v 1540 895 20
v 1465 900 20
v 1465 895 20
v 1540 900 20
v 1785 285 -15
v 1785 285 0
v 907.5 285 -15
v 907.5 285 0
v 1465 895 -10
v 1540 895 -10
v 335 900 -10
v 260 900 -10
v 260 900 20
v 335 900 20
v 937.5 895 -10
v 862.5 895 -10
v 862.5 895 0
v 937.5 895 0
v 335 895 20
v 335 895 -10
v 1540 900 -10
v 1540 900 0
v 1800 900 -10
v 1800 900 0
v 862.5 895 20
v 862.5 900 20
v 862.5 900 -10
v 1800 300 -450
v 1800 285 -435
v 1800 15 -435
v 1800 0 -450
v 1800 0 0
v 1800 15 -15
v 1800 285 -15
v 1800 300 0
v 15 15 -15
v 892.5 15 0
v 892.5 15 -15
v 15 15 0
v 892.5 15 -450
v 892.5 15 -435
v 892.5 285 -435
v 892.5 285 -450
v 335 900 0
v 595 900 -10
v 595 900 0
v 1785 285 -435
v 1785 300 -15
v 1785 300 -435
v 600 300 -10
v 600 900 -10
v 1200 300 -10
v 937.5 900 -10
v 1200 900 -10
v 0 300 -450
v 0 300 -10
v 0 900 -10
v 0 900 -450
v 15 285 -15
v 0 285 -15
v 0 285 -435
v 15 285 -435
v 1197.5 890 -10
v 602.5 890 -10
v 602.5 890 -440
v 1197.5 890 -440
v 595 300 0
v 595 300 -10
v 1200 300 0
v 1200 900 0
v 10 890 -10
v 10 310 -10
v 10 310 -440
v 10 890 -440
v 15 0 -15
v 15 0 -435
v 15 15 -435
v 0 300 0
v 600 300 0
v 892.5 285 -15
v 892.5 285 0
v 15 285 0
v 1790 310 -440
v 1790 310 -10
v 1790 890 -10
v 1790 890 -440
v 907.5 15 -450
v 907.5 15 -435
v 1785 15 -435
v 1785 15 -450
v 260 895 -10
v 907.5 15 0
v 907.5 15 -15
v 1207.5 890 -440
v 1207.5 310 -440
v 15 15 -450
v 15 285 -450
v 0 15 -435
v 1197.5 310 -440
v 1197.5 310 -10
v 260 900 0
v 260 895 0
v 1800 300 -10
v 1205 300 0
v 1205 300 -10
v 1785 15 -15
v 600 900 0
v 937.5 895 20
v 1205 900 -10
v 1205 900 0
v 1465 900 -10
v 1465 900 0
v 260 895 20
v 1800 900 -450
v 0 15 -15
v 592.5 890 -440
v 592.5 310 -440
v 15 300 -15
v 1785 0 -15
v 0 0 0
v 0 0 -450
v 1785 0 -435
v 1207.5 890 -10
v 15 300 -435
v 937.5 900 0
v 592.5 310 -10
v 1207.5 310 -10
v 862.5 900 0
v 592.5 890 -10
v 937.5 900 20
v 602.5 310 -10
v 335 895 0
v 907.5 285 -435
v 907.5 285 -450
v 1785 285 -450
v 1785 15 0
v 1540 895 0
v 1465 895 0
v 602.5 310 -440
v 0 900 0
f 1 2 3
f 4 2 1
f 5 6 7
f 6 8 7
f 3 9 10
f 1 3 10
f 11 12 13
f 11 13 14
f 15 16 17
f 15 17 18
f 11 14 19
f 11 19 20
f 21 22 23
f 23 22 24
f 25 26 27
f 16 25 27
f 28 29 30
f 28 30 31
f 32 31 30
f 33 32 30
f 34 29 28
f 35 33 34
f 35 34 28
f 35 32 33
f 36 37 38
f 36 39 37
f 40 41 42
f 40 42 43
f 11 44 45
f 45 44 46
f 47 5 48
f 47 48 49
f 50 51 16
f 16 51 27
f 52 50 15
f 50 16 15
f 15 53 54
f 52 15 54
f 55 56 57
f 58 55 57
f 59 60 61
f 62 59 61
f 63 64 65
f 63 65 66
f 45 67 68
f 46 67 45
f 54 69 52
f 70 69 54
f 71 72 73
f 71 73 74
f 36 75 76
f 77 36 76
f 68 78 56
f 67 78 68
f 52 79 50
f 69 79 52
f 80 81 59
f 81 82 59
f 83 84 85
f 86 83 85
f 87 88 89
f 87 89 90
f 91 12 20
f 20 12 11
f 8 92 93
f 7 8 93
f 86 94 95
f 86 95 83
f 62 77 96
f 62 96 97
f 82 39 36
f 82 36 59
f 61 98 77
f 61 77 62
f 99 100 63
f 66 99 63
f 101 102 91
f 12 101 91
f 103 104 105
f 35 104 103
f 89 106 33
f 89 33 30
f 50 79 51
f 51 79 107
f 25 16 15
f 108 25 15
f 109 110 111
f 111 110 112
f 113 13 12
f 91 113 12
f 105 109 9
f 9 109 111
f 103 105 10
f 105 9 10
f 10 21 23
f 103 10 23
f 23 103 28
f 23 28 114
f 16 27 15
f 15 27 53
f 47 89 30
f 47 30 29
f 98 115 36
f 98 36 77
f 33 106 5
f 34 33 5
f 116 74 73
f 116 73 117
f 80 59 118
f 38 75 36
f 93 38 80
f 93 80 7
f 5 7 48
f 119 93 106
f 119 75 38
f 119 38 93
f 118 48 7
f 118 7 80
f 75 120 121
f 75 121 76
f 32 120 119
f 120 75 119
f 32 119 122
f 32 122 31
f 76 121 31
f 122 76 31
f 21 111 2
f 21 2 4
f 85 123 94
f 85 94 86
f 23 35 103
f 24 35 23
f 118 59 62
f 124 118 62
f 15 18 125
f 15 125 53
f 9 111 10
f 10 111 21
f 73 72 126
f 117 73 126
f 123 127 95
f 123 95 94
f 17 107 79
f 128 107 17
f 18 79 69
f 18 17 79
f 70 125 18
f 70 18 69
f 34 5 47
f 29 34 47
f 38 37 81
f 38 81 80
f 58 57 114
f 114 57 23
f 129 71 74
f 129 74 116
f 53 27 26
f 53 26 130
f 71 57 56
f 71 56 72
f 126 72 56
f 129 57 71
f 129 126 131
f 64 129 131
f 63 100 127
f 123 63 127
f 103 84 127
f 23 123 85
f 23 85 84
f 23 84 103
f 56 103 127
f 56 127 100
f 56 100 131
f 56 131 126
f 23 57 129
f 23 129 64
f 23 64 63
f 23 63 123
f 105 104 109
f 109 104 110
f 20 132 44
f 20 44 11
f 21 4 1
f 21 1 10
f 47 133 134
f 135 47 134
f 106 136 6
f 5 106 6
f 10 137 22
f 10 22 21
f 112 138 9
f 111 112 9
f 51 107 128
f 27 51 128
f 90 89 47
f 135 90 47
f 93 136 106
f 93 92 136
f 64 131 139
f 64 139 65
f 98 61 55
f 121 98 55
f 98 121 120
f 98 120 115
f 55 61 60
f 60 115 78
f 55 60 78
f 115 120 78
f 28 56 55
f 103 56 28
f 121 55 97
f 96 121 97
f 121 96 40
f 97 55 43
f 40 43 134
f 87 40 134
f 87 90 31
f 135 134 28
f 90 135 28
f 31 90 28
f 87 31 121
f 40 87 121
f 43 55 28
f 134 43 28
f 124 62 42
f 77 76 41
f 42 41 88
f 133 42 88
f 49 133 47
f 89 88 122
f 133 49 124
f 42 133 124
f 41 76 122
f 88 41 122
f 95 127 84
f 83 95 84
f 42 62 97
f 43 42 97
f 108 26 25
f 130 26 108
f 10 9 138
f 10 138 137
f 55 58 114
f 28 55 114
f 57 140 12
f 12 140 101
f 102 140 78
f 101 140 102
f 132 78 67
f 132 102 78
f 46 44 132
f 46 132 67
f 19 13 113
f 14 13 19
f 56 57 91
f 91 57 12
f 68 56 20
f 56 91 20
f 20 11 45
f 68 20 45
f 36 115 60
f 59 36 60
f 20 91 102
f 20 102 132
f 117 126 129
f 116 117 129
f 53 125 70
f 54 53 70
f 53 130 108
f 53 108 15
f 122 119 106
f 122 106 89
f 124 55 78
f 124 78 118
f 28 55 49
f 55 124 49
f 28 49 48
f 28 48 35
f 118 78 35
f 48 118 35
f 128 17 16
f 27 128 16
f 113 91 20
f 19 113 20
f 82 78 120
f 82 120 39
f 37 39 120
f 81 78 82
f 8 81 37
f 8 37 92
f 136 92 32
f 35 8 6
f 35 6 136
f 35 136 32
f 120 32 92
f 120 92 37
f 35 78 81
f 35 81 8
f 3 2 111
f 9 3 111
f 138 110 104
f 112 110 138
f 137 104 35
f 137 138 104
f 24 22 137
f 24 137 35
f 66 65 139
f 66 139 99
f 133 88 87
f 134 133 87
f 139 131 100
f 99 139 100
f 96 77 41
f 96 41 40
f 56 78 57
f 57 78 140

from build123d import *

# Parameters (mm, degrees)
CROQUIS1_W                = 1800
CROQUIS1_H                = 300
CROQUIS1_W_2              = 1770
CROQUIS1_H_2              = 270
SALIENTE_EXTRUIR1_DEPTH   = 450
CROQUIS2_W                = 420
CROQUIS2_H                = 270
CORTAR_EXTRUIR1_DEPTH     = 1900
CROQUIS3_W                = 1770
CROQUIS3_H                = 420
CORTAR_EXTRUIR2_DEPTH     = 400
SALIENTE_EXTRUIR2_START   = -10
CROQUIS4_W                = 1800
CROQUIS4_H                = 600
SALIENTE_EXTRUIR2_DEPTH   = 440
VACIADO1_T                = -10
CROQUIS5_W                = 595
CROQUIS5_H                = 600
SALIENTE_EXTRUIR3_DEPTH   = 10
CROQUIS5_W_2              = 600
SALIENTE_EXTRUIR3_2_DEPTH = 10
SALIENTE_EXTRUIR3_3_DEPTH = 10
CROQUIS6_W                = 15
CROQUIS6_H                = 15
SALIENTE_EXTRUIR4_DEPTH   = 300
SALIENTE_EXTRUIR5_START   = -10
CROQUIS7_W                = 10
CROQUIS7_H                = 600
SALIENTE_EXTRUIR5_DEPTH   = 430
CORTAR_EXTRUIR3_START     = 895
CROQUIS8_W                = 75
CROQUIS8_H                = 10
CORTAR_EXTRUIR3_DEPTH     = 5
SALIENTE_EXTRUIR6_START   = 900
CROQUIS9_W                = 75
CROQUIS9_H                = 30
SALIENTE_EXTRUIR6_DEPTH   = 5
SALIENTE_EXTRUIR6_2_DEPTH = 5
SALIENTE_EXTRUIR6_3_DEPTH = 5


with BuildPart() as part:
    # Croquis1 → Saliente-Extruir1 (new body)
    with BuildSketch(Plane.XY):
        with Locations((900, 150)):
            Rectangle(CROQUIS1_W, CROQUIS1_H)
        with Locations((900, 150)):
            Rectangle(CROQUIS1_W_2, CROQUIS1_H_2, mode=Mode.SUBTRACT)
    extrude(amount=-SALIENTE_EXTRUIR1_DEPTH)

    # Croquis2 → Cortar-Extruir1 (cut)
    with BuildSketch(Plane(origin=(0, 0, 0), x_dir=(0, 0, -1), z_dir=(1, 0, 0))):
        with Locations((225, 150)):
            Rectangle(CROQUIS2_W, CROQUIS2_H)
    extrude(amount=CORTAR_EXTRUIR1_DEPTH, mode=Mode.SUBTRACT)

    # Croquis3 → Cortar-Extruir2 (cut)
    with BuildSketch(Plane(origin=(0, 0, 0), x_dir=(1, 0, 0), z_dir=(0, 1, 0))):
        with Locations((900, 225)):
            Rectangle(CROQUIS3_W, CROQUIS3_H)
    extrude(amount=CORTAR_EXTRUIR2_DEPTH, mode=Mode.SUBTRACT)

    # Croquis6 → Saliente-Extruir4 (add)
    with BuildSketch(Plane(origin=(0, 0, 0), x_dir=(1, 0, 0), z_dir=(0, 1, 0))):
        with Locations((900, 7.5)):
            Rectangle(CROQUIS6_W, CROQUIS6_H)
        with Locations((900, 442.5)):
            Rectangle(CROQUIS6_W, CROQUIS6_H)
    extrude(amount=SALIENTE_EXTRUIR4_DEPTH)


with BuildPart() as body_2:
    # Croquis4 → Saliente-Extruir2 (new body)
    with BuildSketch(Plane.XY.offset(SALIENTE_EXTRUIR2_START)):
        with Locations((900, 600)):
            Rectangle(CROQUIS4_W, CROQUIS4_H)
    extrude(amount=-SALIENTE_EXTRUIR2_DEPTH)

    # Vaciado1
    vaciado1_openings = [body_2.faces().sort_by_distance(p)[0] for p in [
        (900, 600, -10),
    ]]
    offset(amount=VACIADO1_T, openings=vaciado1_openings, kind=Kind.INTERSECTION)

    # Croquis7 → Saliente-Extruir5 (add)
    with BuildSketch(Plane.XY.offset(SALIENTE_EXTRUIR5_START)):
        with Locations((597.5, 600)):
            Rectangle(CROQUIS7_W, CROQUIS7_H)
        with Locations((1202.5, 600)):
            Rectangle(CROQUIS7_W, CROQUIS7_H)
    extrude(amount=-SALIENTE_EXTRUIR5_DEPTH)


with BuildPart() as body_3:
    # Croquis5 → Saliente-Extruir3 (new body)
    with BuildSketch(Plane.XY):
        with Locations((297.5, 600)):
            Rectangle(CROQUIS5_W, CROQUIS5_H)
    extrude(amount=-SALIENTE_EXTRUIR3_DEPTH)


with BuildPart() as body_4:
    # Croquis5 → Saliente-Extruir3 2 (new body)
    with BuildSketch(Plane.XY):
        with Locations((900, 600)):
            Rectangle(CROQUIS5_W_2, CROQUIS5_H)
    extrude(amount=-SALIENTE_EXTRUIR3_2_DEPTH)


with BuildPart() as body_5:
    # Croquis5 → Saliente-Extruir3 3 (new body)
    with BuildSketch(Plane.XY):
        with Locations((1502.5, 600)):
            Rectangle(CROQUIS5_W, CROQUIS5_H)
    extrude(amount=-SALIENTE_EXTRUIR3_3_DEPTH)


with BuildPart() as cortar_extruir3_tool:
    # Croquis8 → Cortar-Extruir3 (new body)
    with BuildSketch(Plane(origin=(0, 0, 0), x_dir=(1, 0, 0), z_dir=(0, 1, 0)).offset(CORTAR_EXTRUIR3_START)):
        with Locations((297.5, 5)):
            Rectangle(CROQUIS8_W, CROQUIS8_H)
        with Locations((900, 5)):
            Rectangle(CROQUIS8_W, CROQUIS8_H)
        with Locations((1502.5, 5)):
            Rectangle(CROQUIS8_W, CROQUIS8_H)
    extrude(amount=CORTAR_EXTRUIR3_DEPTH)


with BuildPart() as body_3_1:
    add(body_3.part)

    # Cortar-Extruir3: cut by cortar_extruir3_tool
    add(cortar_extruir3_tool.part, mode=Mode.SUBTRACT)


with BuildPart() as body_4_1:
    add(body_4.part)

    # Cortar-Extruir3: cut by cortar_extruir3_tool
    add(cortar_extruir3_tool.part, mode=Mode.SUBTRACT)


with BuildPart() as body_5_1:
    add(body_5.part)

    # Cortar-Extruir3: cut by cortar_extruir3_tool
    add(cortar_extruir3_tool.part, mode=Mode.SUBTRACT)


with BuildPart() as body_6:
    # Croquis9 → Saliente-Extruir6 (new body)
    with BuildSketch(Plane(origin=(0, 0, 0), x_dir=(1, 0, 0), z_dir=(0, 1, 0)).offset(SALIENTE_EXTRUIR6_START)):
        with Locations((297.5, -5)):
            Rectangle(CROQUIS9_W, CROQUIS9_H)
    extrude(amount=-SALIENTE_EXTRUIR6_DEPTH)


with BuildPart() as body_7:
    # Croquis9 → Saliente-Extruir6 2 (new body)
    with BuildSketch(Plane(origin=(0, 0, 0), x_dir=(1, 0, 0), z_dir=(0, 1, 0)).offset(SALIENTE_EXTRUIR6_START)):
        with Locations((900, -5)):
            Rectangle(CROQUIS9_W, CROQUIS9_H)
    extrude(amount=-SALIENTE_EXTRUIR6_2_DEPTH)


with BuildPart() as body_8:
    # Croquis9 → Saliente-Extruir6 3 (new body)
    with BuildSketch(Plane(origin=(0, 0, 0), x_dir=(1, 0, 0), z_dir=(0, 1, 0)).offset(SALIENTE_EXTRUIR6_START)):
        with Locations((1502.5, -5)):
            Rectangle(CROQUIS9_W, CROQUIS9_H)
    extrude(amount=-SALIENTE_EXTRUIR6_3_DEPTH)


solid = Compound([part.part, body_2.part, body_3_1.part, body_4_1.part, body_5_1.part, body_6.part, body_7.part, body_8.part])
